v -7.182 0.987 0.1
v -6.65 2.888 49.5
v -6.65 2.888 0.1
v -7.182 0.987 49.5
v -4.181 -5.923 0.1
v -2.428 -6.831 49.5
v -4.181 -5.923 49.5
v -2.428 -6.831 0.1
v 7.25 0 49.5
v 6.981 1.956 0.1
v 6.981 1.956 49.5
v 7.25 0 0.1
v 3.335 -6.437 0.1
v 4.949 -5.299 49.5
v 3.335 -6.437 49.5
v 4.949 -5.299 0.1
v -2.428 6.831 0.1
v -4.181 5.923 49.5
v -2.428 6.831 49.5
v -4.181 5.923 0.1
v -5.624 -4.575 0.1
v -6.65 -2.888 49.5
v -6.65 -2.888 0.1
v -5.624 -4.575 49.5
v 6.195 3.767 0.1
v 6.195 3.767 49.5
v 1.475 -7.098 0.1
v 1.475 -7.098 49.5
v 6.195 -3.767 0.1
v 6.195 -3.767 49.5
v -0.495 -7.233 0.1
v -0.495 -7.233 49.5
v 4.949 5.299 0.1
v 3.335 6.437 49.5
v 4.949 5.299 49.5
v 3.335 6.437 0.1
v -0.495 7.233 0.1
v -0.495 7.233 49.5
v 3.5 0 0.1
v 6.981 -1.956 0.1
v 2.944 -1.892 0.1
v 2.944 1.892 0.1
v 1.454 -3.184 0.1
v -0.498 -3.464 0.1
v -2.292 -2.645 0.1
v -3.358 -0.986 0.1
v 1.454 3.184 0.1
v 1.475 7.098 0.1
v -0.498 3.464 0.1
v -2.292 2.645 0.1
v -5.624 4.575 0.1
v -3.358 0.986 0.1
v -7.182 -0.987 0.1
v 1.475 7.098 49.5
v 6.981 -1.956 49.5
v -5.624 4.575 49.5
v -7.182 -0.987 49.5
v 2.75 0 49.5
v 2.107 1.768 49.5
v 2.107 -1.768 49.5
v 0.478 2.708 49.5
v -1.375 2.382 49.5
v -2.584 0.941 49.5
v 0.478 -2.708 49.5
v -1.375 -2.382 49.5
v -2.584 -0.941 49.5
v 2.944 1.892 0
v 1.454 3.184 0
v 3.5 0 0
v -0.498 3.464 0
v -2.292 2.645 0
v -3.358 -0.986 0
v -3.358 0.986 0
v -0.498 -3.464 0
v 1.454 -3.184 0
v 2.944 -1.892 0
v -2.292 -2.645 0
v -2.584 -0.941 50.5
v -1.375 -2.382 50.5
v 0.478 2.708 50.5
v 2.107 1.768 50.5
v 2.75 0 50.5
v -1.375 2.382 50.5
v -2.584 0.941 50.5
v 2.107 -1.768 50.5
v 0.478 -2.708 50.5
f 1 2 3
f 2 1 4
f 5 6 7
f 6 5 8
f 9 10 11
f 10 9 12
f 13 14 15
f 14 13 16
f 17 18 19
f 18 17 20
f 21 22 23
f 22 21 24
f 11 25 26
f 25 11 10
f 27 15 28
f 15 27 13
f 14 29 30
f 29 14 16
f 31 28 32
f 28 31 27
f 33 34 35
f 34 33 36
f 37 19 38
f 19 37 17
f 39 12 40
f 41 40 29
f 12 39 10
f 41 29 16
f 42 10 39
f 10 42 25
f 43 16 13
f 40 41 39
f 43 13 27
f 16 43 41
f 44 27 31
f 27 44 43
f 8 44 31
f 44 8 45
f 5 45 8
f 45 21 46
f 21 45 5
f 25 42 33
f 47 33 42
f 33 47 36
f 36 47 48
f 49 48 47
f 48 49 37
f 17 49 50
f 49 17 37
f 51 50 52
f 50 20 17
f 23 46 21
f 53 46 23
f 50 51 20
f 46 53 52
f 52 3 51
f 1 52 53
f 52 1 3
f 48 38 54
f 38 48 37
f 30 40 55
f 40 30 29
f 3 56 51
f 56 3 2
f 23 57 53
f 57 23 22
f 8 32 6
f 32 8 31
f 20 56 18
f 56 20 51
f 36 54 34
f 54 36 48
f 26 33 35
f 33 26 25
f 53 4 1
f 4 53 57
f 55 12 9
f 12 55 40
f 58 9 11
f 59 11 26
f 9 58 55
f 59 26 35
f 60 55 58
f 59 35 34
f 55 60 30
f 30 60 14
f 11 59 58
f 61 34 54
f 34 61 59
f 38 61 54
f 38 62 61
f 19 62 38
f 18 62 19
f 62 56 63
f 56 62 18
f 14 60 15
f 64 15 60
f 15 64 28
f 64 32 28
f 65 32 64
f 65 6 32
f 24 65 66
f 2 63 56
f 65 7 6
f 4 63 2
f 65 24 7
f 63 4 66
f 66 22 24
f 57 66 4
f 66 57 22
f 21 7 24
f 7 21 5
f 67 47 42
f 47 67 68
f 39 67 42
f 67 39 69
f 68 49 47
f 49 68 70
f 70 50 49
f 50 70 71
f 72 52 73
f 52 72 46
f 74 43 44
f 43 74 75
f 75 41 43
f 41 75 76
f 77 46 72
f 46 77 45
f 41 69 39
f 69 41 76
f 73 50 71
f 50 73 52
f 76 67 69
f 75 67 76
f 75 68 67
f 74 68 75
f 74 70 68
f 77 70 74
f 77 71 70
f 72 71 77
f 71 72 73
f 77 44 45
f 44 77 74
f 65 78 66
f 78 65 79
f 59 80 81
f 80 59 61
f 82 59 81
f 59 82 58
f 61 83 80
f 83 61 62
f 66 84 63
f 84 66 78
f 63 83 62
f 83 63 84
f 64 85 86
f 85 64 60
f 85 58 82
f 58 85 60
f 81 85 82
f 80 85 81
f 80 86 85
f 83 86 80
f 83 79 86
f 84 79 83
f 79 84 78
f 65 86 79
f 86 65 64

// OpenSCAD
// file: ../machine.scad
/*
 * Helpers for machinging; i.e. kerf alowances
 *
 * Copyright 2013 <b@Zi.iS>
 * License CC BY 3.0
 */

ZCUT = 0;
XOFF = 0;
YOFF = 0;

module drawing() {
	//create blueprint
	if(preview==0) {
		projection(cut=true) translate([
			XOFF,
			YOFF,
			ZCUT
		]) {
            if($children) children([0:$children-1]);
		}
	} else {
        if($children) children([0:$children-1]);
	}
}

module kerf_cube(
	size
) {
	translate([
		kerf/2*(1-preview),
		kerf/2*(1-preview),
		0
	]) {
		cube([
			size[0] - kerf*(1-preview),
			size[1] - kerf*(1-preview),
			size[2]
		]);
	}
}

module kerf_cylinder(
	r,
	h
) {
	cylinder(
		r = r - kerf/2*(1-preview),
		h = h
	);
}

module part(
	id,
	name
) {
	if(PART<1 || PART==id || id<0) {
		if(id>=0) echo(str("PART", id, ":", name));
        if($children) children([0:$children-1]);
	}	
}
// file: ../easing.scad
/*
 * Make allowances to ensure good fit.
 *
 * Copyright 2013 <b@Zi.iS>
 * License CC BY 3.0
 */

function ease(value) = min(value*1.1, value + .2);
// file: ../epslion.scad
/*
 * Slightly offset previews to overcome rounding issues
 *
 * Copyright 2013 <b@Zi.iS>
 * License CC BY 3.0
 */

include <config.scad>;

module e(
	shift = -.1,
	size = 1.1
) {
	if(preview == 1) {
		translate([
			0,
			0,
			shift
		]) {
			scale([
				1,
				1,
				size
			]) {
                if($children) children([0:$children-1]);
			}
		}
	} else {
        if($children) children([0:$children-1]);
	}
}

function space(pitch, i) = -pitch/2 + pitch*i;
// file: ../config.scad
/*
 * Default settings
 *
 * Copyright 2013 <b@Zi.iS>
 * License CC BY 3.0
 */

preview = 1;
$fa = 6;
$fs = 2 - 1.5*(1-preview);
kerf = .3;
PART = 0; //all

// preview colors
color_steel = [.8, .8, .8];
color_wood = [.3, .3, 0];
color_print = [0, .8, 0];
color_plastic = [.7, 1, .7];
color_brass = [181/255, 166/255, 66/255];
color_acrylic = [.9,.9,.9,.5];
// file: ../main.scad
/*
 * A library to make SCAD easier.
 *
 * Copyright 2013 <b@Zi.iS>
 * License CC BY 3.0
 */

include <config.scad>;
use <epslion.scad>;
use <easing.scad>;
include <machine.scad>;
// main file
/*
 * Batteries
 *
 * Copyright 2014 <b@Zi.iS>
 * License CC BY 3.0
 */

include <../main.scad>;

aa();

module aa(id) {
	part(id, "AA Battery") {
		translate([0,0,0.1])
			cylinder(
				d=14.5,
				h=50.5-1.1
			);
		color([.7,.7,.7])
			cylinder(
				d=7,
				h=0.1
			);
		color([.7,.7,.7])
			cylinder(
				d=5.5,
				h=50.5
			);
	}
}
